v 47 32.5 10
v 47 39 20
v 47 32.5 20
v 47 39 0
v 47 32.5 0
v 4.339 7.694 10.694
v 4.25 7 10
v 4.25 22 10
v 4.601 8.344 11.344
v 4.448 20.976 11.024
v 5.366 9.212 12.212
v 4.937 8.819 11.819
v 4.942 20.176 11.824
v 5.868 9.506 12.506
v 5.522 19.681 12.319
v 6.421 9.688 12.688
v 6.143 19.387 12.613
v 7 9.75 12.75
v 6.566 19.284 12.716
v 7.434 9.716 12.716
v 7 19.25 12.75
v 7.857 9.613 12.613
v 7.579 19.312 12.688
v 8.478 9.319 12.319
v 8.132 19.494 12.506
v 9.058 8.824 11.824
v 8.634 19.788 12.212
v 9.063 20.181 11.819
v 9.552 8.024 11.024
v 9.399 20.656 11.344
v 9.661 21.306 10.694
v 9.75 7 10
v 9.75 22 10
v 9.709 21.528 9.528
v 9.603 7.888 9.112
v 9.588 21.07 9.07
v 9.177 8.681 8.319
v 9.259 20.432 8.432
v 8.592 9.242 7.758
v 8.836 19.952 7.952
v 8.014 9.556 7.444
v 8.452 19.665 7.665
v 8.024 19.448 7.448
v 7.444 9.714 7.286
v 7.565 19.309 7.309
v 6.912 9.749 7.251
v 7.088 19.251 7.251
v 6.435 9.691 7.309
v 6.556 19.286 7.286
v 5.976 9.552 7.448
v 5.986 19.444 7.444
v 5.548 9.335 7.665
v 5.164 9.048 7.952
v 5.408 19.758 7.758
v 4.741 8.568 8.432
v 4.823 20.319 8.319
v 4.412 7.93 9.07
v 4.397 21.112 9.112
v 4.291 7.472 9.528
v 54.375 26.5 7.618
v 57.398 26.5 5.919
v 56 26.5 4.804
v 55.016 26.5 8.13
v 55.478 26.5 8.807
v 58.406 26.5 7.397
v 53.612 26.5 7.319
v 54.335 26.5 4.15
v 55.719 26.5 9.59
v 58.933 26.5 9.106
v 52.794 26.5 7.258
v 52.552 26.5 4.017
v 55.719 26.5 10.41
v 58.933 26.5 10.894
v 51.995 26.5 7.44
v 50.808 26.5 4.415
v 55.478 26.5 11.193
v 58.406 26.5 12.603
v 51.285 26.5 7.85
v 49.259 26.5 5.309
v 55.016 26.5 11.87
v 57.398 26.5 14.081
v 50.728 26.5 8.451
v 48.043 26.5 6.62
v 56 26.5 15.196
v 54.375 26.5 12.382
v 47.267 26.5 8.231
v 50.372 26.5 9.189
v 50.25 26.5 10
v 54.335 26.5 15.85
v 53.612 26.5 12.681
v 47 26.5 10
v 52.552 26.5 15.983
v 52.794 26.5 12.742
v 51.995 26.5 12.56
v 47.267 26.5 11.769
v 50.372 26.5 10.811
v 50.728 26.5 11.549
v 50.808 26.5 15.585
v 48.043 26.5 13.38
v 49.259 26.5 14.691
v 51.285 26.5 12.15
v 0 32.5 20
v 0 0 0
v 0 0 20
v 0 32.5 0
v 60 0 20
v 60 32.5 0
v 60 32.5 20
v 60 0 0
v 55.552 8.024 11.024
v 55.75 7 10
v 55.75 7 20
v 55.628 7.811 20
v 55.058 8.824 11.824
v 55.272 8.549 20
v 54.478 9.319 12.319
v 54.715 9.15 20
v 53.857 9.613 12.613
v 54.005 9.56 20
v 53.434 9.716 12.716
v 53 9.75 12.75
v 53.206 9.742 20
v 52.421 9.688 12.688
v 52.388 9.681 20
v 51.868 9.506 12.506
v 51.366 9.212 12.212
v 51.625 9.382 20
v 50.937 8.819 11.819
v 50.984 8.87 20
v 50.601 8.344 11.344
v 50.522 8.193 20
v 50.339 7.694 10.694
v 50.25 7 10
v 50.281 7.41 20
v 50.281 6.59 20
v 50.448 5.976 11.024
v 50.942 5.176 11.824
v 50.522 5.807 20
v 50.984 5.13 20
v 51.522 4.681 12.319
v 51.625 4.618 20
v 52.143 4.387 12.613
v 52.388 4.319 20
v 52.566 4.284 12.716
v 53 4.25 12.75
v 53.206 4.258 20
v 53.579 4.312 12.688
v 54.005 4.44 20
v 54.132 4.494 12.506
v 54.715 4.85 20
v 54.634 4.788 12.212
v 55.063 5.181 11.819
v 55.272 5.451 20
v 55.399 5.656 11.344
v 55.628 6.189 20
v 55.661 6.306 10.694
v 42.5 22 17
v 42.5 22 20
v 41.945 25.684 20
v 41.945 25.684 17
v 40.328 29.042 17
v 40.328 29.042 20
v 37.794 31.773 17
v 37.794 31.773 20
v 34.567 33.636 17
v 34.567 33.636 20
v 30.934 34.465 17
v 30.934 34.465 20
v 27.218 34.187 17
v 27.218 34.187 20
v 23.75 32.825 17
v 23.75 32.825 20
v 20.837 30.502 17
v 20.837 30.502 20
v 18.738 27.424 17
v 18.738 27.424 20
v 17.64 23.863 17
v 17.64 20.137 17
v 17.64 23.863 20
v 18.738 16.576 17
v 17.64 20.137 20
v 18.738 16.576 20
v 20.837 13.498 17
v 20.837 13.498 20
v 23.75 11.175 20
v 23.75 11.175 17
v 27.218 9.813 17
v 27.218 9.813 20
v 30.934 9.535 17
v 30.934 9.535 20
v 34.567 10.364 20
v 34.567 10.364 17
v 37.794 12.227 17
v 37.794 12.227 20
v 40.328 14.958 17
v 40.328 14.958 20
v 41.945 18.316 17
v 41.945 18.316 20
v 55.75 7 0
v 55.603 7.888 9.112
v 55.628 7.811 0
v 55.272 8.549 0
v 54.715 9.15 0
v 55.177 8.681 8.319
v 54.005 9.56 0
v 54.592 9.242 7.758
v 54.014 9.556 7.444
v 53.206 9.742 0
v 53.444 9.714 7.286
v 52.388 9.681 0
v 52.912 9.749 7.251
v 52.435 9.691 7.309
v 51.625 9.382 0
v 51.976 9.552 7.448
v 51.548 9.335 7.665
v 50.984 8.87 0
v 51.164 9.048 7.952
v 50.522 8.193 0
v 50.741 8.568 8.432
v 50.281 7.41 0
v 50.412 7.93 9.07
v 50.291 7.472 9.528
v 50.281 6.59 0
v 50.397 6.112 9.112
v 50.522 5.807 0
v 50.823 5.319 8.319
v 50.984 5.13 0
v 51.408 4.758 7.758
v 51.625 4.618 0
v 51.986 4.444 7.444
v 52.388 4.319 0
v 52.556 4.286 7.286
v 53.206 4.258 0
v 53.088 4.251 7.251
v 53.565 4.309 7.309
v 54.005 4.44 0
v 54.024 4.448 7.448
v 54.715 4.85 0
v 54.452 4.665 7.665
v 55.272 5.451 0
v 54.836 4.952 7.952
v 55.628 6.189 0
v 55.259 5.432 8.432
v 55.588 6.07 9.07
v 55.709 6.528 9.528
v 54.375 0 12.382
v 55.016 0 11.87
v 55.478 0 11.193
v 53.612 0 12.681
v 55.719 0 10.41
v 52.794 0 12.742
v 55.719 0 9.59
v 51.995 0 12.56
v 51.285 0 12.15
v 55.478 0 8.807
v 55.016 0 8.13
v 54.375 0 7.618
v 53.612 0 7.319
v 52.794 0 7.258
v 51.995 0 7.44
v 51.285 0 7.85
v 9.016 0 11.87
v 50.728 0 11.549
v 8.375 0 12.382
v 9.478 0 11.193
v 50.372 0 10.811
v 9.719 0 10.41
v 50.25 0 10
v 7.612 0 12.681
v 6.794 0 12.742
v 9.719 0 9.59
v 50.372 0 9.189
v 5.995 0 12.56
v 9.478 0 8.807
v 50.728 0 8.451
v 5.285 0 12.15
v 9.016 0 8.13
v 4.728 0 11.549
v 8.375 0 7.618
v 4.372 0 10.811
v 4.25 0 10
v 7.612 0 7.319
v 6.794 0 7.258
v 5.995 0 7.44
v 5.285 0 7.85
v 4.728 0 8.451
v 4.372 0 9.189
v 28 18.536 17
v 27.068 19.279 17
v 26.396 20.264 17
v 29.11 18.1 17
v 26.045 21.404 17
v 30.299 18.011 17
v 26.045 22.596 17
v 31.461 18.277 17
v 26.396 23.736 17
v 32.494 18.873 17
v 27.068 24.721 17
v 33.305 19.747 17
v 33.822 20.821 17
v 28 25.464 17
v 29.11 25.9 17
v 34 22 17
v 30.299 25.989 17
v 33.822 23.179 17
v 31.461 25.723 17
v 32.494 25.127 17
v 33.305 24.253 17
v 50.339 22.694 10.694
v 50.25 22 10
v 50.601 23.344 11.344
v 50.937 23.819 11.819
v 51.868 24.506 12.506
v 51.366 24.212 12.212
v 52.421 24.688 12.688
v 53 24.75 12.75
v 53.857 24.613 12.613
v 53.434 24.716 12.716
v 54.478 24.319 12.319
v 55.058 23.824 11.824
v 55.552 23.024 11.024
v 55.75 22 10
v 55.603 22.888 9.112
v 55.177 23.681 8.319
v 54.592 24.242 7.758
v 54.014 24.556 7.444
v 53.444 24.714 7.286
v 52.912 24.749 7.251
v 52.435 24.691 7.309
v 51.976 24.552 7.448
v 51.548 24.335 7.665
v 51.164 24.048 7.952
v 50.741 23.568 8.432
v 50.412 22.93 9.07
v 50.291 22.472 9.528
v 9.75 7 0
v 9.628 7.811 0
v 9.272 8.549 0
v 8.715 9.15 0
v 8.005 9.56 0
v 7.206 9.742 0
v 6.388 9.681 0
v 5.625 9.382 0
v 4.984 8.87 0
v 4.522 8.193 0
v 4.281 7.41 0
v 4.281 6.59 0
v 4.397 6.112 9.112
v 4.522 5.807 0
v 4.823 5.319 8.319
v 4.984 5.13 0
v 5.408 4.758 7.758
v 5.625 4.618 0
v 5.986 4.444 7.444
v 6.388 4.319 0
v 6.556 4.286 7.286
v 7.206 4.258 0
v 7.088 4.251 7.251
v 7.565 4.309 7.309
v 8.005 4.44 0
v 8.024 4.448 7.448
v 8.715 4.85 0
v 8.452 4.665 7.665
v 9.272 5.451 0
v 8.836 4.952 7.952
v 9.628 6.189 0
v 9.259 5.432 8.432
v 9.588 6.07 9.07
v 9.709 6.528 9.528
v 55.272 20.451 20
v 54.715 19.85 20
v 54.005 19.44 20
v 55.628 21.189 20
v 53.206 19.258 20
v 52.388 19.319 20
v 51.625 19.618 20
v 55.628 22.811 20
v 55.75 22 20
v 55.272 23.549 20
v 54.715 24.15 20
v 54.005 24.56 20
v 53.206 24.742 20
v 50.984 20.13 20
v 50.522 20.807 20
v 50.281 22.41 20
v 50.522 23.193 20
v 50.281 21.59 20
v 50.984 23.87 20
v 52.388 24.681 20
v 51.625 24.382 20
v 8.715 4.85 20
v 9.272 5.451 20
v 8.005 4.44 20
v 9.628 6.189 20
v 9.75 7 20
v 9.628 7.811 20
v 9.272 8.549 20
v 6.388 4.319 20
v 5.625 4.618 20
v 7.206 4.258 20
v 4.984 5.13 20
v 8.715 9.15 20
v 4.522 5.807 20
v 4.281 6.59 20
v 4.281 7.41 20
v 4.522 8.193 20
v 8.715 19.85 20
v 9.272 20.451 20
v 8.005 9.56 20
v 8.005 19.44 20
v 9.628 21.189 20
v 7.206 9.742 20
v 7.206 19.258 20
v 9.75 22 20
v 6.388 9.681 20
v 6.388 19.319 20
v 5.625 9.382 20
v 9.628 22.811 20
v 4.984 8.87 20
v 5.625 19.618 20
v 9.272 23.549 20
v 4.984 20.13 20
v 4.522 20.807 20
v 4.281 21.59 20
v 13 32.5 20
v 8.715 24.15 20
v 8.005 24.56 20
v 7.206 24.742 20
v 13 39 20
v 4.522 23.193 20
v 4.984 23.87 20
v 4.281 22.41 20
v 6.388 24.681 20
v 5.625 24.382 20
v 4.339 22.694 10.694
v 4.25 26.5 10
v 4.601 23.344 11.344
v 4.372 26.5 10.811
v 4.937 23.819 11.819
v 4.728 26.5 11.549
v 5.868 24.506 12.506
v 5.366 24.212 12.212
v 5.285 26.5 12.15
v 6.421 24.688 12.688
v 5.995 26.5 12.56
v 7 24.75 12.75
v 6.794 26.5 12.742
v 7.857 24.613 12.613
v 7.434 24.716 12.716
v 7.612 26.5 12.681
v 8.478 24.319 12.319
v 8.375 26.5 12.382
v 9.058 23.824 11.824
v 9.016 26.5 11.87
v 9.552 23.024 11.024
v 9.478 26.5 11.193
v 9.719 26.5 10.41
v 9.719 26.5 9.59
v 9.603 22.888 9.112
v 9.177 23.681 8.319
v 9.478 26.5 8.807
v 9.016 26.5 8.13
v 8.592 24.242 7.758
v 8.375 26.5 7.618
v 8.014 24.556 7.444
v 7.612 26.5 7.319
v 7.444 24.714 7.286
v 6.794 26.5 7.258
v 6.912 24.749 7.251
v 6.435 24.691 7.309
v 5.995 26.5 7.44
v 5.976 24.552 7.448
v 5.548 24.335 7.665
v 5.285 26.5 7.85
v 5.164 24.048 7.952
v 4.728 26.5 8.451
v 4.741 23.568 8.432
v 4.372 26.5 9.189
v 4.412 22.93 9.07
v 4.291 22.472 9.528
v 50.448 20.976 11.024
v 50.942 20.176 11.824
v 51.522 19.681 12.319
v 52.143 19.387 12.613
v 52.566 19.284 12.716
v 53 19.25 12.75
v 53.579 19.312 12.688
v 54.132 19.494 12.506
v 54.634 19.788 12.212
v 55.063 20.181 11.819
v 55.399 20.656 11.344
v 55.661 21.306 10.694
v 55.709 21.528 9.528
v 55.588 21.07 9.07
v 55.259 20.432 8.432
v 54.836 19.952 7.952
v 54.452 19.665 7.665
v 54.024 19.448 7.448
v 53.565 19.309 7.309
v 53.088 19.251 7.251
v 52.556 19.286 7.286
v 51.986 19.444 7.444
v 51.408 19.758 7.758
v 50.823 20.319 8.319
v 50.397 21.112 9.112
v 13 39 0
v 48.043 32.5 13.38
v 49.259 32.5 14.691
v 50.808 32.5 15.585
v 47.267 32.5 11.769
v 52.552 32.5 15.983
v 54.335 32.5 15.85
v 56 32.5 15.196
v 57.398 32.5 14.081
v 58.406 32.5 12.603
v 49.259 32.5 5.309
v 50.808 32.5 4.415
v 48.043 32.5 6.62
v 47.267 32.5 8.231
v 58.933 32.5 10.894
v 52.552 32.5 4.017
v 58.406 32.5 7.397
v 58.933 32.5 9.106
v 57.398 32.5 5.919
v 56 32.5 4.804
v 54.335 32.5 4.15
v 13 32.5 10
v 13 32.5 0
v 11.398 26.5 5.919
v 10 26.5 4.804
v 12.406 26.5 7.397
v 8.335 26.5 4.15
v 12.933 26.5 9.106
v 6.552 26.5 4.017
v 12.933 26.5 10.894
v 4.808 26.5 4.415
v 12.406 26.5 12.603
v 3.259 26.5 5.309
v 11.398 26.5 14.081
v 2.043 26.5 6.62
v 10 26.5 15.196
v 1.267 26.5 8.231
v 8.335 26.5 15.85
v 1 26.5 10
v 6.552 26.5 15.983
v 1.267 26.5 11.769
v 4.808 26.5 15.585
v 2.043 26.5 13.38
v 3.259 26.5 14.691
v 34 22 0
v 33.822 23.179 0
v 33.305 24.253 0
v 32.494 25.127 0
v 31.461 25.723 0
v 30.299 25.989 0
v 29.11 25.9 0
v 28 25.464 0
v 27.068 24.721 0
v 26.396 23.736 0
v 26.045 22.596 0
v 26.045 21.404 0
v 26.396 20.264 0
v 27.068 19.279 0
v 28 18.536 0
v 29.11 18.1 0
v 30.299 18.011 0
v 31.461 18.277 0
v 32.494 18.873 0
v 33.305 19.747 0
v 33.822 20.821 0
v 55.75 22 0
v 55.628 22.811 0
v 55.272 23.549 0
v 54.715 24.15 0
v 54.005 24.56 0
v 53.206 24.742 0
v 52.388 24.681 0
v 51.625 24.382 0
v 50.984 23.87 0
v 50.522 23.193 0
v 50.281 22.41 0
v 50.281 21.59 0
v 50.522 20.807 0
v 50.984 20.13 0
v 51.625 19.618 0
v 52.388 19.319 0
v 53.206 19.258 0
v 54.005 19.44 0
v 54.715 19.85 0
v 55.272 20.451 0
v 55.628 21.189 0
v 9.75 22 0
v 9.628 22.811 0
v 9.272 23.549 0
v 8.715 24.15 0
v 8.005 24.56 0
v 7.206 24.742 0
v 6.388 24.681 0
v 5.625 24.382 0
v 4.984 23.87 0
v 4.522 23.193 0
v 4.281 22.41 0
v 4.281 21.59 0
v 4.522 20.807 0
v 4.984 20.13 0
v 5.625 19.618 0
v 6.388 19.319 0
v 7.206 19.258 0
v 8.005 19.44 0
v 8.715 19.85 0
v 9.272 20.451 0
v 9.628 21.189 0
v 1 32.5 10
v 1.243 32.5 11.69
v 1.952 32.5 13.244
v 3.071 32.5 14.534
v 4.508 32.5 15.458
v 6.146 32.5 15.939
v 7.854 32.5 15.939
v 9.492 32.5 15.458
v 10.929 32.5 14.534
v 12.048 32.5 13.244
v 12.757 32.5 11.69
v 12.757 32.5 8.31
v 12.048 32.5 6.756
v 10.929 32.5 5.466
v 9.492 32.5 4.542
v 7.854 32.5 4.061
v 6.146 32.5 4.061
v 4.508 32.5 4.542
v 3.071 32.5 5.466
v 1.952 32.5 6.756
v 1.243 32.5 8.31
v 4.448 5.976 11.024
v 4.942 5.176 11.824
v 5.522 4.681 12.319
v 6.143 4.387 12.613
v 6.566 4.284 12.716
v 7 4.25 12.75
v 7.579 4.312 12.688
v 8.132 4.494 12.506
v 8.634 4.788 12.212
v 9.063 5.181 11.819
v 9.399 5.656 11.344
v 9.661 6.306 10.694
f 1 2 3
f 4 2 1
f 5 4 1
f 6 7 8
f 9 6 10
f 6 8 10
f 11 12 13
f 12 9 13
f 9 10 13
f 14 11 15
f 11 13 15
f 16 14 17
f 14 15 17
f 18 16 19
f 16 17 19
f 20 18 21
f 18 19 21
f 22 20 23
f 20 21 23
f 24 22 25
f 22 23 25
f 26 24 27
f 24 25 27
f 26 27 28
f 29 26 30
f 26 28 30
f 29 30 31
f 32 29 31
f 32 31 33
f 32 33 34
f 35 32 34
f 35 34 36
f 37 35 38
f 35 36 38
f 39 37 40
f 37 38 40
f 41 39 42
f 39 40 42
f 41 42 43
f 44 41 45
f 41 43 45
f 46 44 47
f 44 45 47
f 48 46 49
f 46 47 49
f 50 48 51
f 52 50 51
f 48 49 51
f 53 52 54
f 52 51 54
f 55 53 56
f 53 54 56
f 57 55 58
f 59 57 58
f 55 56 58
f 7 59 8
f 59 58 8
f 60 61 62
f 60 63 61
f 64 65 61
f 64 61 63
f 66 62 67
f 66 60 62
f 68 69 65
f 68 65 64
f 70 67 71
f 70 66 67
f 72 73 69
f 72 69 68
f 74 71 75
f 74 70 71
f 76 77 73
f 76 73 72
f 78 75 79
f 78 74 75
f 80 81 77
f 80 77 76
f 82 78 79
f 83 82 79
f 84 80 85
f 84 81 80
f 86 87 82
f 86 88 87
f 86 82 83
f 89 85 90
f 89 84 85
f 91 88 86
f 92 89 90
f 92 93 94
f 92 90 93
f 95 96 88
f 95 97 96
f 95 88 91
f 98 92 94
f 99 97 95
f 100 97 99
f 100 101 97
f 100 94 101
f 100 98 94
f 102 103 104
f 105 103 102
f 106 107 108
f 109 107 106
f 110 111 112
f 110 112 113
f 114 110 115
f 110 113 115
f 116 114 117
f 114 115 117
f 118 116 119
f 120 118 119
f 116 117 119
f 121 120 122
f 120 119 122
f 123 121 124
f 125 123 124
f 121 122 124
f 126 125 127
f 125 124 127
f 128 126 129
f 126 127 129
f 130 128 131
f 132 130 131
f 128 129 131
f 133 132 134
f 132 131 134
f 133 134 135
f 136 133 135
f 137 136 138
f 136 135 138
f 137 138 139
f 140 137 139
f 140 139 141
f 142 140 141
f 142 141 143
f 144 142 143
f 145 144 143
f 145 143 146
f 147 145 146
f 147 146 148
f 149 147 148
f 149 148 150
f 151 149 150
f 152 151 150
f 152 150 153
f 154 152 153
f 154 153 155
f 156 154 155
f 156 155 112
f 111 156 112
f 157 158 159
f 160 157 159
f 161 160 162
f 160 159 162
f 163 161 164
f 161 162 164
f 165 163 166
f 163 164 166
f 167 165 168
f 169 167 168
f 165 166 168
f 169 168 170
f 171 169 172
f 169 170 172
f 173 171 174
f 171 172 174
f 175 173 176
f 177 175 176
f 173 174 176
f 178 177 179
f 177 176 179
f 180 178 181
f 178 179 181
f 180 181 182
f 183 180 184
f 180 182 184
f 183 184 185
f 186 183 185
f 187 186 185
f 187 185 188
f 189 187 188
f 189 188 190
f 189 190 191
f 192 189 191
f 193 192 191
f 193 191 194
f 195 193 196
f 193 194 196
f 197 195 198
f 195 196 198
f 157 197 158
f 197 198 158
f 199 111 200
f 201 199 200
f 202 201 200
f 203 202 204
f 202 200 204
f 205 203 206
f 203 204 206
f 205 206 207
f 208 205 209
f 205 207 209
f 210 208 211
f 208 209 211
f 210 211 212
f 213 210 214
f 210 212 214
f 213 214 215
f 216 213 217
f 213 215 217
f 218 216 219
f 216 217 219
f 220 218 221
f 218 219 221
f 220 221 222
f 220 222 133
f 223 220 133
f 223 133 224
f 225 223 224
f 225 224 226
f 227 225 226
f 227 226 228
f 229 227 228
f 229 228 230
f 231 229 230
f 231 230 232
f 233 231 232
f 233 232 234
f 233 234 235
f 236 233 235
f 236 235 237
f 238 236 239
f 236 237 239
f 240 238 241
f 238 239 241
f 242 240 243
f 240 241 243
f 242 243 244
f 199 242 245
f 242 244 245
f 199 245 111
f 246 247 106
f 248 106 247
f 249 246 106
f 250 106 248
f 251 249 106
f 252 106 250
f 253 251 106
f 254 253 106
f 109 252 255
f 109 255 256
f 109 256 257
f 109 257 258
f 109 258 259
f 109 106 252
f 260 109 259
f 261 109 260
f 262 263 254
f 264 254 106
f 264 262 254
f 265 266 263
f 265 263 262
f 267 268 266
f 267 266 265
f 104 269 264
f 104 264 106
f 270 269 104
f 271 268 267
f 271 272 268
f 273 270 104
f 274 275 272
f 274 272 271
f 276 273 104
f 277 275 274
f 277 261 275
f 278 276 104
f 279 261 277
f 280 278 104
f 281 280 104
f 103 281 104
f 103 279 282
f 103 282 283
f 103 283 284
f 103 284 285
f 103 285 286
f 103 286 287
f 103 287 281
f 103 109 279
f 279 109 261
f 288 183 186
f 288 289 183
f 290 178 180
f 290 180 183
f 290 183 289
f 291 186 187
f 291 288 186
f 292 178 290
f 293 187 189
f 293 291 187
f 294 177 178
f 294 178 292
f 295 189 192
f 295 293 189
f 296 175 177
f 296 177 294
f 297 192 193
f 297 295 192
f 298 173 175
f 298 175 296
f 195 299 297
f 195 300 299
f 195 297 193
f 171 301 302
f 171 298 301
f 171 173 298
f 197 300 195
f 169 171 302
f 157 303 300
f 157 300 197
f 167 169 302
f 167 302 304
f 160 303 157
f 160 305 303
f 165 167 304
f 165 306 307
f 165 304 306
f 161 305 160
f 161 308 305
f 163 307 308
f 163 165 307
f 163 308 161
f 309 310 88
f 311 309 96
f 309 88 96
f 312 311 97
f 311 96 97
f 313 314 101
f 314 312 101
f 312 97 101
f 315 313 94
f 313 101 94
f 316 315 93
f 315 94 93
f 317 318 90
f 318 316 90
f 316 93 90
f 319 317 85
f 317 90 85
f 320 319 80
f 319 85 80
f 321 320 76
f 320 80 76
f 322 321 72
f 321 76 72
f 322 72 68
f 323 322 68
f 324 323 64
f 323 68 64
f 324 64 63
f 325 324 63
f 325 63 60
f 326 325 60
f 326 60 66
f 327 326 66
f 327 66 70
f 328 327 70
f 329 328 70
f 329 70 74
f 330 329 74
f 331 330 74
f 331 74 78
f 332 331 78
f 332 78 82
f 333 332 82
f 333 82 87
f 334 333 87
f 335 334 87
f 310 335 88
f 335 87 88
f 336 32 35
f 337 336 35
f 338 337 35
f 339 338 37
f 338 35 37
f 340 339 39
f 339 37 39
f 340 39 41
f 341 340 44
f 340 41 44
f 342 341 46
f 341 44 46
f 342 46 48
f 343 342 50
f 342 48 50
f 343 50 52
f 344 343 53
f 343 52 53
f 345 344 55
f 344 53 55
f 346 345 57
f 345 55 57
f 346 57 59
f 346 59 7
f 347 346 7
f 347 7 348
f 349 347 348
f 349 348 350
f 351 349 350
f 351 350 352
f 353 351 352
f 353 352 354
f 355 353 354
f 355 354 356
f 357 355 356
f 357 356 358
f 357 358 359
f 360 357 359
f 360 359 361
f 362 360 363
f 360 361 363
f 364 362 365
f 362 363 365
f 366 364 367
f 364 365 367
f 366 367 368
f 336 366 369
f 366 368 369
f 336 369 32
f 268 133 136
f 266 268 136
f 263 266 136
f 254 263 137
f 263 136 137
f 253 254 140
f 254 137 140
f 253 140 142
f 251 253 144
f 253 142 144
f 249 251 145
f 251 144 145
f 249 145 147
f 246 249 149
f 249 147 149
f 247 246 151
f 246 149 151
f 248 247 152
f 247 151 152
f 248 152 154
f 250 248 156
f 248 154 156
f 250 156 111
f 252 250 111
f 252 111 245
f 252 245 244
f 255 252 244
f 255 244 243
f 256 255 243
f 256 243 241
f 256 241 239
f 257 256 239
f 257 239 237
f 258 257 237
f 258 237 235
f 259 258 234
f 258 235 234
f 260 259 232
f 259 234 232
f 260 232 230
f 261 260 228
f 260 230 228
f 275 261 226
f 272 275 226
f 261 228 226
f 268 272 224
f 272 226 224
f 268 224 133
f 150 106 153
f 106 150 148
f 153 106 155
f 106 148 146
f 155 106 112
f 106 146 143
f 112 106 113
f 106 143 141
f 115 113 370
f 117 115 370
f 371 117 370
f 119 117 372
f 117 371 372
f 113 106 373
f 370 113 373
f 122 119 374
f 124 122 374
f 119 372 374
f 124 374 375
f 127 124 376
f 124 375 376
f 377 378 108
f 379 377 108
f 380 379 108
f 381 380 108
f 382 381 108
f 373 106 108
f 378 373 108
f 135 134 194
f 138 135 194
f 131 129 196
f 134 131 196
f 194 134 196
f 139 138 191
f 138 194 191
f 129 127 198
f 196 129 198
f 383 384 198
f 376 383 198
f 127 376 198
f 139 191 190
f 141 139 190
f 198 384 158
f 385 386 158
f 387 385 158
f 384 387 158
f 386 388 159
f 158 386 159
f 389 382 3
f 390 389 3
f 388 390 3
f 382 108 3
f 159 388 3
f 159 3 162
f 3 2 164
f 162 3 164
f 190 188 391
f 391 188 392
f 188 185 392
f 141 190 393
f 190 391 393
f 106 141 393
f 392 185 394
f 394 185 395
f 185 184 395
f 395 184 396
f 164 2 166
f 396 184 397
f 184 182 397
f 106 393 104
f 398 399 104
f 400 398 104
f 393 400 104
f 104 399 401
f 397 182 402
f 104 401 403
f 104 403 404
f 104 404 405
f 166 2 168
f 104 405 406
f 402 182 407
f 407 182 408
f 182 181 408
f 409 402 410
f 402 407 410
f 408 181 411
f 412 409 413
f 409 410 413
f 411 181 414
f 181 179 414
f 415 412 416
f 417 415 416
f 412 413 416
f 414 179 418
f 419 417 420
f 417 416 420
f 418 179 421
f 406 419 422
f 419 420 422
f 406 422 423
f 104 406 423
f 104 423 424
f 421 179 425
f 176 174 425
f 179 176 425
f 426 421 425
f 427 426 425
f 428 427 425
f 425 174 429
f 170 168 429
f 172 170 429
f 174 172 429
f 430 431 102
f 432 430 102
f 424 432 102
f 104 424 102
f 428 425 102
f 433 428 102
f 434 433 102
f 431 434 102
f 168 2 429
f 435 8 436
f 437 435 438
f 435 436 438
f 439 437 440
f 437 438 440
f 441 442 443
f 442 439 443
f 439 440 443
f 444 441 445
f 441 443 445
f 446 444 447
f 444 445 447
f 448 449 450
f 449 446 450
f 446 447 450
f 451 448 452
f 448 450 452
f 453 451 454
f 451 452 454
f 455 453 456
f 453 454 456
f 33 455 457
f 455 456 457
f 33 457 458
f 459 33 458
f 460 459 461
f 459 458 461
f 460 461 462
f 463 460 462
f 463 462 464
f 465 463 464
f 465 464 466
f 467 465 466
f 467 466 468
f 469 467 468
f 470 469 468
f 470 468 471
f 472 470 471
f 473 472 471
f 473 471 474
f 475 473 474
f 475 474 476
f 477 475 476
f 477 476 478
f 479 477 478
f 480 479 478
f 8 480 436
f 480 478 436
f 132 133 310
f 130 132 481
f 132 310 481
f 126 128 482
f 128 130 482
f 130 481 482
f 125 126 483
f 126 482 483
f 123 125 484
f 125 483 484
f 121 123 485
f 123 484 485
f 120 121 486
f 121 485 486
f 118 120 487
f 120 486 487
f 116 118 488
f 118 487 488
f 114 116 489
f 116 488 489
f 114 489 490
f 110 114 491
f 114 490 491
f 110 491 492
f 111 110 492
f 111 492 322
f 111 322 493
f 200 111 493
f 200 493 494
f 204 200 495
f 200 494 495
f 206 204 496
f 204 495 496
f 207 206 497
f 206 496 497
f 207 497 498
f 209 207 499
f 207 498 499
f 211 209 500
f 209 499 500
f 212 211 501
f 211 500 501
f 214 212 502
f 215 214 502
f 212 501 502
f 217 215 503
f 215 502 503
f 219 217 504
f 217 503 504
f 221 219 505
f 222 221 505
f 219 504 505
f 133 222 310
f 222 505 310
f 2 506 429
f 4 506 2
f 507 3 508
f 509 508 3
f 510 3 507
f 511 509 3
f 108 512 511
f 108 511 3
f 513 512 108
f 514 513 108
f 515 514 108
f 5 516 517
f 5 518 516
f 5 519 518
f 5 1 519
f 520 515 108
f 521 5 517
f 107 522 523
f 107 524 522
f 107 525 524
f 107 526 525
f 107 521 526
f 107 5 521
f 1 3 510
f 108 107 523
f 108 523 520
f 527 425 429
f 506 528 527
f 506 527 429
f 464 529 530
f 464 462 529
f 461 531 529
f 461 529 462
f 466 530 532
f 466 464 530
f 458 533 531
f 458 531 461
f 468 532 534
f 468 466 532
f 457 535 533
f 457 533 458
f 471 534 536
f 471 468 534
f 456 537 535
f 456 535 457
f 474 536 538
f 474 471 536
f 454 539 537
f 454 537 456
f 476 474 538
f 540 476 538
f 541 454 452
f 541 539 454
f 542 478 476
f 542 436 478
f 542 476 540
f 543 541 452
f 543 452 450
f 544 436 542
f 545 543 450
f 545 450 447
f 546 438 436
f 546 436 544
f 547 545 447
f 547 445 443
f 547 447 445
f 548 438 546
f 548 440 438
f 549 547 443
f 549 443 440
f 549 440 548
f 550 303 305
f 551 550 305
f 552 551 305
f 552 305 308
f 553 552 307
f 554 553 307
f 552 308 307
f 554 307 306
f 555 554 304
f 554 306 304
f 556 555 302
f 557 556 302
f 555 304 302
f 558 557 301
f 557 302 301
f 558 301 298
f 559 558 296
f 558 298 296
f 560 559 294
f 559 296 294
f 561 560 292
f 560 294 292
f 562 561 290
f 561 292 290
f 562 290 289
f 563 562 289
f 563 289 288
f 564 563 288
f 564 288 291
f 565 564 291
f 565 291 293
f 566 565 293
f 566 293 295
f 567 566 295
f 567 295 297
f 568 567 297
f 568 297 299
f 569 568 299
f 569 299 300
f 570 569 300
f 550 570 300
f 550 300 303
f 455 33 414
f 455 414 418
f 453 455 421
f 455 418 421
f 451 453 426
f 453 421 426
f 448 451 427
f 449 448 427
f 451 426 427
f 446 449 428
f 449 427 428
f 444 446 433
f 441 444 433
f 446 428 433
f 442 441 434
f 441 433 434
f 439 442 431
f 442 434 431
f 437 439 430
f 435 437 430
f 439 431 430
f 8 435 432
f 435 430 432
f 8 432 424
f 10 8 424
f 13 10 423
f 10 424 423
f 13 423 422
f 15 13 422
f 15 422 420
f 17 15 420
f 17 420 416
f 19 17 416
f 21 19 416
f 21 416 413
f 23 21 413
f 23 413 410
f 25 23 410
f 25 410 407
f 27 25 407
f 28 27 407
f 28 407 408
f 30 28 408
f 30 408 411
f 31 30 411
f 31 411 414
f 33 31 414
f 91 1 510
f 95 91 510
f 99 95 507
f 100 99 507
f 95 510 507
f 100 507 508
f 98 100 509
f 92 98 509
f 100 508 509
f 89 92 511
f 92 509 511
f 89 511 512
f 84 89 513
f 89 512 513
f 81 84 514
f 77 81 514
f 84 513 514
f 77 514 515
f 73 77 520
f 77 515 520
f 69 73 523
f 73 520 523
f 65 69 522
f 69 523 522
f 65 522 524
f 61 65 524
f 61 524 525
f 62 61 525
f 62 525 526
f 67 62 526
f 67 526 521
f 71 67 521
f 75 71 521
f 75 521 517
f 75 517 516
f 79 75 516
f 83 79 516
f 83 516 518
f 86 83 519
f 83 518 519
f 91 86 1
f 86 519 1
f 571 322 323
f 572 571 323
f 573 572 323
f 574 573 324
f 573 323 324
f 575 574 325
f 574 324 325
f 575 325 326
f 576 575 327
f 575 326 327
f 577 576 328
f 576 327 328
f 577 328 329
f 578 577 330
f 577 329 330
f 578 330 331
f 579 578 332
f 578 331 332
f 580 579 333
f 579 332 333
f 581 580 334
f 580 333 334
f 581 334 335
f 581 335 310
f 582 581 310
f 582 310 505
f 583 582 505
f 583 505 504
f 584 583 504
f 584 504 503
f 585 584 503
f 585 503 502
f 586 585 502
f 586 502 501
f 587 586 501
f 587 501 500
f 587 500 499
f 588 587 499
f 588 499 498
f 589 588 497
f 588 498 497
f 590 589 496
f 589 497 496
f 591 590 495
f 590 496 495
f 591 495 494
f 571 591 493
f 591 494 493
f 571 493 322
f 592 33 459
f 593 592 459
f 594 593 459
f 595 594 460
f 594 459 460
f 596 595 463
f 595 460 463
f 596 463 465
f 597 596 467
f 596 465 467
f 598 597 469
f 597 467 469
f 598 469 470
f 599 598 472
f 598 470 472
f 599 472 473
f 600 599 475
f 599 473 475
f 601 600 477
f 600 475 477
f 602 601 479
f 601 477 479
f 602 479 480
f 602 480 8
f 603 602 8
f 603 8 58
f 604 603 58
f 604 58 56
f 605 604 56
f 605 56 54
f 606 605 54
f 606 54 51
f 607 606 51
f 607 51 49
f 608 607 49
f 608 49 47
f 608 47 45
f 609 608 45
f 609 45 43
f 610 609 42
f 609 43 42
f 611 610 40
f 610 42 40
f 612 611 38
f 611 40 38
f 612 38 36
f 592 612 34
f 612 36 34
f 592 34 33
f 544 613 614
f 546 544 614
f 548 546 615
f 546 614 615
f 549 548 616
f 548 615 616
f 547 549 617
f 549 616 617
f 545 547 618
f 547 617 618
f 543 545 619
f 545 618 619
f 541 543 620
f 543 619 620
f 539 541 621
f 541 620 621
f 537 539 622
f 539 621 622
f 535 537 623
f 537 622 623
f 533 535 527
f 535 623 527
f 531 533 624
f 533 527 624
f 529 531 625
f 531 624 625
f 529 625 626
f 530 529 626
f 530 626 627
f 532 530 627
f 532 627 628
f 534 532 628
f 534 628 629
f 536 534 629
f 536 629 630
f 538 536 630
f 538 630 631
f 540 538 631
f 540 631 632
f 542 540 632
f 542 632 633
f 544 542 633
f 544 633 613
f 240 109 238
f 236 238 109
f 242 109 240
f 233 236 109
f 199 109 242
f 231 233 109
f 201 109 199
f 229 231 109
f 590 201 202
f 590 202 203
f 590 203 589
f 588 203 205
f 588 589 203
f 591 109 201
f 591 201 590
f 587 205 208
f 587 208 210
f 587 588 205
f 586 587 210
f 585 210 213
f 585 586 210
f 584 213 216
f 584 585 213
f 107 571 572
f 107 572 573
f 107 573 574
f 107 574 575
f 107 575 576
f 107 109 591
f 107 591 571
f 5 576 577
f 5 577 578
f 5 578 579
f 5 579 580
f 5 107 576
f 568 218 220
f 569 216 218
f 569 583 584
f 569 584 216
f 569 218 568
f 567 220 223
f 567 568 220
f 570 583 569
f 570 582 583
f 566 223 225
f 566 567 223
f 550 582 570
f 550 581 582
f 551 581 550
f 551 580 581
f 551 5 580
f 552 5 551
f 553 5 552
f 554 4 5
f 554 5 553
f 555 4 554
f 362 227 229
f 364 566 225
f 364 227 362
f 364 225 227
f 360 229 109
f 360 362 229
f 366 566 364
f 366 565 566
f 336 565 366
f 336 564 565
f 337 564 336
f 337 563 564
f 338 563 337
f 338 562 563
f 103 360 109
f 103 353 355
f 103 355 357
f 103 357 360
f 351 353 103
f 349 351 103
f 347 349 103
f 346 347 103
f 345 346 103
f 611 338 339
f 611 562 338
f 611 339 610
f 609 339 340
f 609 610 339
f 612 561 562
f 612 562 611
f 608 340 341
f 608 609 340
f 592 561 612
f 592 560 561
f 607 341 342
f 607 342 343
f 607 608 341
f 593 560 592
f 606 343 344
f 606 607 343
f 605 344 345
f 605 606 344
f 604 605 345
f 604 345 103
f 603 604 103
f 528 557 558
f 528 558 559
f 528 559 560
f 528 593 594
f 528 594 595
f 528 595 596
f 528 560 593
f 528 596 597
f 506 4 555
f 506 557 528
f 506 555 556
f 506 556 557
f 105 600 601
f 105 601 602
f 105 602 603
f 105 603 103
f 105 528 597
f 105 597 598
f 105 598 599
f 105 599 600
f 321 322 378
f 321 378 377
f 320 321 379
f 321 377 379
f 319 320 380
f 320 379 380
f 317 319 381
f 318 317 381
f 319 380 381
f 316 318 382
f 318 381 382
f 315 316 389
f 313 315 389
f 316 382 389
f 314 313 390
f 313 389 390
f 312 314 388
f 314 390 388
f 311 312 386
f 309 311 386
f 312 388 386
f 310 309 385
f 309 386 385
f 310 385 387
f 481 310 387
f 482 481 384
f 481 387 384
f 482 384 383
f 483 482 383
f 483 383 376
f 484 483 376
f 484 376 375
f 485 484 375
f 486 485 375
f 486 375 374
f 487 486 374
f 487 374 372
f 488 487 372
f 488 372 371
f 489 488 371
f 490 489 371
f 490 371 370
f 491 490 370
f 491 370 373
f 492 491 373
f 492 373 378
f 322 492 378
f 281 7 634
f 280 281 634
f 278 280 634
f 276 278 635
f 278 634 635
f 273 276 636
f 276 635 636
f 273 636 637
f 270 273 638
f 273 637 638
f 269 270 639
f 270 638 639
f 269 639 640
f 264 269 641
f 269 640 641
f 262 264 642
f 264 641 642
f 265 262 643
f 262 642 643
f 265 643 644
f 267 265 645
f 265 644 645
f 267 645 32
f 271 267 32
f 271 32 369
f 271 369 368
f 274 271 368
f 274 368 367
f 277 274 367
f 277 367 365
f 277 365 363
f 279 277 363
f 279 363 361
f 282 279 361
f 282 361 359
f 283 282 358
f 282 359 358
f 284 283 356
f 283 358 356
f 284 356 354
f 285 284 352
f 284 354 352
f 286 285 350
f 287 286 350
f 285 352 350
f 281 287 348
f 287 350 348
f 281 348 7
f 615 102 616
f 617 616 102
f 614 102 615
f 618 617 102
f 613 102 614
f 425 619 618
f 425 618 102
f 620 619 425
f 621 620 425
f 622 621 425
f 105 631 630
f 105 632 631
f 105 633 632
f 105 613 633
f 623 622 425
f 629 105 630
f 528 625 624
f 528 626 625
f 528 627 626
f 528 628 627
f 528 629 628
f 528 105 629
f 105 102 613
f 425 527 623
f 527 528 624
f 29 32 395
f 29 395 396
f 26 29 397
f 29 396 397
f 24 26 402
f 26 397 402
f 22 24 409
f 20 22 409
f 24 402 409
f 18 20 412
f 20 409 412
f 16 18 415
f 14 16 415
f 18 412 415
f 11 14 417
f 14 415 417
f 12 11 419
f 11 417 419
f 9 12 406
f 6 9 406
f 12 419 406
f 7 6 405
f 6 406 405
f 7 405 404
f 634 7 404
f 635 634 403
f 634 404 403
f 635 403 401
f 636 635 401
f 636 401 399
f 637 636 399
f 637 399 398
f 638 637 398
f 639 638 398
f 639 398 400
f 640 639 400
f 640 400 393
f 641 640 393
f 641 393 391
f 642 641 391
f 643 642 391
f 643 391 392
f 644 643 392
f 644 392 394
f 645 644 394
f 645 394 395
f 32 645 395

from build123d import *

# Parameters (mm, degrees)
EXTRUDE_1_DEPTH     = 20
SKETCH_2_R          = 2.75
SKETCH_2_R_2        = 4
CUT_EXTRUDE_1_DEPTH = 75.303431953
SKETCH_3_R          = 12.5
CUT_EXTRUDE_2_DEPTH = 3
SKETCH_4_R          = 2.75
CUT_EXTRUDE_3_DEPTH = 72.107313267
SKETCH_5_R          = 6
CUT_EXTRUDE_4_DEPTH = 6


with BuildPart() as part:
    # Эскиз1 → Бобышка-Вытянуть1 (new body)
    with BuildSketch(Plane.XY):
        Polygon((47, 32.5), (60, 32.5), (60, 0), (0, 0), (0, 32.5), (13, 32.5), (13, 39), (47, 39), align=None)
    extrude(amount=EXTRUDE_1_DEPTH)

    # Эскиз2 → Вырез-Вытянуть1 (cut, through all)
    with BuildSketch(Plane.XY.offset(20)):
        with Locations((7, 22)):
            Circle(SKETCH_2_R)
        with Locations((7, 7)):
            Circle(SKETCH_2_R)
        with Locations((53, 22)):
            Circle(SKETCH_2_R)
        with Locations((53, 7)):
            Circle(SKETCH_2_R)
        with Locations((30, 22)):
            Circle(SKETCH_2_R_2)
    extrude(amount=-CUT_EXTRUDE_1_DEPTH, mode=Mode.SUBTRACT)

    # Эскиз3 → Вырез-Вытянуть2 (cut)
    with BuildSketch(Plane.XY.offset(20)):
        with Locations((30, 22)):
            Circle(SKETCH_3_R)
    extrude(amount=-CUT_EXTRUDE_2_DEPTH, mode=Mode.SUBTRACT)

    # Эскиз4 → Вырез-Вытянуть3 (cut, through all)
    with BuildSketch(Plane(origin=(0, 32.5, 0), x_dir=(1, 0, 0), z_dir=(0, 1, 0))):
        with Locations(Location((7, -10, 0), (0, 0, 180))):
            Circle(SKETCH_4_R)
        with Locations(Location((53, -10, 0), (0, 0, 180))):
            Circle(SKETCH_4_R)
    extrude(amount=-CUT_EXTRUDE_3_DEPTH, mode=Mode.SUBTRACT)

    # Эскиз5 → Вырез-Вытянуть4 (cut)
    with BuildSketch(Plane(origin=(0, 32.5, 0), x_dir=(1, 0, 0), z_dir=(0, 1, 0))):
        with Locations(Location((7, -10, 0), (0, 0, 180))):
            Circle(SKETCH_5_R)
        with Locations(Location((53, -10, 0), (0, 0, 180))):
            Circle(SKETCH_5_R)
    extrude(amount=-CUT_EXTRUDE_4_DEPTH, mode=Mode.SUBTRACT)


solid = part.part
